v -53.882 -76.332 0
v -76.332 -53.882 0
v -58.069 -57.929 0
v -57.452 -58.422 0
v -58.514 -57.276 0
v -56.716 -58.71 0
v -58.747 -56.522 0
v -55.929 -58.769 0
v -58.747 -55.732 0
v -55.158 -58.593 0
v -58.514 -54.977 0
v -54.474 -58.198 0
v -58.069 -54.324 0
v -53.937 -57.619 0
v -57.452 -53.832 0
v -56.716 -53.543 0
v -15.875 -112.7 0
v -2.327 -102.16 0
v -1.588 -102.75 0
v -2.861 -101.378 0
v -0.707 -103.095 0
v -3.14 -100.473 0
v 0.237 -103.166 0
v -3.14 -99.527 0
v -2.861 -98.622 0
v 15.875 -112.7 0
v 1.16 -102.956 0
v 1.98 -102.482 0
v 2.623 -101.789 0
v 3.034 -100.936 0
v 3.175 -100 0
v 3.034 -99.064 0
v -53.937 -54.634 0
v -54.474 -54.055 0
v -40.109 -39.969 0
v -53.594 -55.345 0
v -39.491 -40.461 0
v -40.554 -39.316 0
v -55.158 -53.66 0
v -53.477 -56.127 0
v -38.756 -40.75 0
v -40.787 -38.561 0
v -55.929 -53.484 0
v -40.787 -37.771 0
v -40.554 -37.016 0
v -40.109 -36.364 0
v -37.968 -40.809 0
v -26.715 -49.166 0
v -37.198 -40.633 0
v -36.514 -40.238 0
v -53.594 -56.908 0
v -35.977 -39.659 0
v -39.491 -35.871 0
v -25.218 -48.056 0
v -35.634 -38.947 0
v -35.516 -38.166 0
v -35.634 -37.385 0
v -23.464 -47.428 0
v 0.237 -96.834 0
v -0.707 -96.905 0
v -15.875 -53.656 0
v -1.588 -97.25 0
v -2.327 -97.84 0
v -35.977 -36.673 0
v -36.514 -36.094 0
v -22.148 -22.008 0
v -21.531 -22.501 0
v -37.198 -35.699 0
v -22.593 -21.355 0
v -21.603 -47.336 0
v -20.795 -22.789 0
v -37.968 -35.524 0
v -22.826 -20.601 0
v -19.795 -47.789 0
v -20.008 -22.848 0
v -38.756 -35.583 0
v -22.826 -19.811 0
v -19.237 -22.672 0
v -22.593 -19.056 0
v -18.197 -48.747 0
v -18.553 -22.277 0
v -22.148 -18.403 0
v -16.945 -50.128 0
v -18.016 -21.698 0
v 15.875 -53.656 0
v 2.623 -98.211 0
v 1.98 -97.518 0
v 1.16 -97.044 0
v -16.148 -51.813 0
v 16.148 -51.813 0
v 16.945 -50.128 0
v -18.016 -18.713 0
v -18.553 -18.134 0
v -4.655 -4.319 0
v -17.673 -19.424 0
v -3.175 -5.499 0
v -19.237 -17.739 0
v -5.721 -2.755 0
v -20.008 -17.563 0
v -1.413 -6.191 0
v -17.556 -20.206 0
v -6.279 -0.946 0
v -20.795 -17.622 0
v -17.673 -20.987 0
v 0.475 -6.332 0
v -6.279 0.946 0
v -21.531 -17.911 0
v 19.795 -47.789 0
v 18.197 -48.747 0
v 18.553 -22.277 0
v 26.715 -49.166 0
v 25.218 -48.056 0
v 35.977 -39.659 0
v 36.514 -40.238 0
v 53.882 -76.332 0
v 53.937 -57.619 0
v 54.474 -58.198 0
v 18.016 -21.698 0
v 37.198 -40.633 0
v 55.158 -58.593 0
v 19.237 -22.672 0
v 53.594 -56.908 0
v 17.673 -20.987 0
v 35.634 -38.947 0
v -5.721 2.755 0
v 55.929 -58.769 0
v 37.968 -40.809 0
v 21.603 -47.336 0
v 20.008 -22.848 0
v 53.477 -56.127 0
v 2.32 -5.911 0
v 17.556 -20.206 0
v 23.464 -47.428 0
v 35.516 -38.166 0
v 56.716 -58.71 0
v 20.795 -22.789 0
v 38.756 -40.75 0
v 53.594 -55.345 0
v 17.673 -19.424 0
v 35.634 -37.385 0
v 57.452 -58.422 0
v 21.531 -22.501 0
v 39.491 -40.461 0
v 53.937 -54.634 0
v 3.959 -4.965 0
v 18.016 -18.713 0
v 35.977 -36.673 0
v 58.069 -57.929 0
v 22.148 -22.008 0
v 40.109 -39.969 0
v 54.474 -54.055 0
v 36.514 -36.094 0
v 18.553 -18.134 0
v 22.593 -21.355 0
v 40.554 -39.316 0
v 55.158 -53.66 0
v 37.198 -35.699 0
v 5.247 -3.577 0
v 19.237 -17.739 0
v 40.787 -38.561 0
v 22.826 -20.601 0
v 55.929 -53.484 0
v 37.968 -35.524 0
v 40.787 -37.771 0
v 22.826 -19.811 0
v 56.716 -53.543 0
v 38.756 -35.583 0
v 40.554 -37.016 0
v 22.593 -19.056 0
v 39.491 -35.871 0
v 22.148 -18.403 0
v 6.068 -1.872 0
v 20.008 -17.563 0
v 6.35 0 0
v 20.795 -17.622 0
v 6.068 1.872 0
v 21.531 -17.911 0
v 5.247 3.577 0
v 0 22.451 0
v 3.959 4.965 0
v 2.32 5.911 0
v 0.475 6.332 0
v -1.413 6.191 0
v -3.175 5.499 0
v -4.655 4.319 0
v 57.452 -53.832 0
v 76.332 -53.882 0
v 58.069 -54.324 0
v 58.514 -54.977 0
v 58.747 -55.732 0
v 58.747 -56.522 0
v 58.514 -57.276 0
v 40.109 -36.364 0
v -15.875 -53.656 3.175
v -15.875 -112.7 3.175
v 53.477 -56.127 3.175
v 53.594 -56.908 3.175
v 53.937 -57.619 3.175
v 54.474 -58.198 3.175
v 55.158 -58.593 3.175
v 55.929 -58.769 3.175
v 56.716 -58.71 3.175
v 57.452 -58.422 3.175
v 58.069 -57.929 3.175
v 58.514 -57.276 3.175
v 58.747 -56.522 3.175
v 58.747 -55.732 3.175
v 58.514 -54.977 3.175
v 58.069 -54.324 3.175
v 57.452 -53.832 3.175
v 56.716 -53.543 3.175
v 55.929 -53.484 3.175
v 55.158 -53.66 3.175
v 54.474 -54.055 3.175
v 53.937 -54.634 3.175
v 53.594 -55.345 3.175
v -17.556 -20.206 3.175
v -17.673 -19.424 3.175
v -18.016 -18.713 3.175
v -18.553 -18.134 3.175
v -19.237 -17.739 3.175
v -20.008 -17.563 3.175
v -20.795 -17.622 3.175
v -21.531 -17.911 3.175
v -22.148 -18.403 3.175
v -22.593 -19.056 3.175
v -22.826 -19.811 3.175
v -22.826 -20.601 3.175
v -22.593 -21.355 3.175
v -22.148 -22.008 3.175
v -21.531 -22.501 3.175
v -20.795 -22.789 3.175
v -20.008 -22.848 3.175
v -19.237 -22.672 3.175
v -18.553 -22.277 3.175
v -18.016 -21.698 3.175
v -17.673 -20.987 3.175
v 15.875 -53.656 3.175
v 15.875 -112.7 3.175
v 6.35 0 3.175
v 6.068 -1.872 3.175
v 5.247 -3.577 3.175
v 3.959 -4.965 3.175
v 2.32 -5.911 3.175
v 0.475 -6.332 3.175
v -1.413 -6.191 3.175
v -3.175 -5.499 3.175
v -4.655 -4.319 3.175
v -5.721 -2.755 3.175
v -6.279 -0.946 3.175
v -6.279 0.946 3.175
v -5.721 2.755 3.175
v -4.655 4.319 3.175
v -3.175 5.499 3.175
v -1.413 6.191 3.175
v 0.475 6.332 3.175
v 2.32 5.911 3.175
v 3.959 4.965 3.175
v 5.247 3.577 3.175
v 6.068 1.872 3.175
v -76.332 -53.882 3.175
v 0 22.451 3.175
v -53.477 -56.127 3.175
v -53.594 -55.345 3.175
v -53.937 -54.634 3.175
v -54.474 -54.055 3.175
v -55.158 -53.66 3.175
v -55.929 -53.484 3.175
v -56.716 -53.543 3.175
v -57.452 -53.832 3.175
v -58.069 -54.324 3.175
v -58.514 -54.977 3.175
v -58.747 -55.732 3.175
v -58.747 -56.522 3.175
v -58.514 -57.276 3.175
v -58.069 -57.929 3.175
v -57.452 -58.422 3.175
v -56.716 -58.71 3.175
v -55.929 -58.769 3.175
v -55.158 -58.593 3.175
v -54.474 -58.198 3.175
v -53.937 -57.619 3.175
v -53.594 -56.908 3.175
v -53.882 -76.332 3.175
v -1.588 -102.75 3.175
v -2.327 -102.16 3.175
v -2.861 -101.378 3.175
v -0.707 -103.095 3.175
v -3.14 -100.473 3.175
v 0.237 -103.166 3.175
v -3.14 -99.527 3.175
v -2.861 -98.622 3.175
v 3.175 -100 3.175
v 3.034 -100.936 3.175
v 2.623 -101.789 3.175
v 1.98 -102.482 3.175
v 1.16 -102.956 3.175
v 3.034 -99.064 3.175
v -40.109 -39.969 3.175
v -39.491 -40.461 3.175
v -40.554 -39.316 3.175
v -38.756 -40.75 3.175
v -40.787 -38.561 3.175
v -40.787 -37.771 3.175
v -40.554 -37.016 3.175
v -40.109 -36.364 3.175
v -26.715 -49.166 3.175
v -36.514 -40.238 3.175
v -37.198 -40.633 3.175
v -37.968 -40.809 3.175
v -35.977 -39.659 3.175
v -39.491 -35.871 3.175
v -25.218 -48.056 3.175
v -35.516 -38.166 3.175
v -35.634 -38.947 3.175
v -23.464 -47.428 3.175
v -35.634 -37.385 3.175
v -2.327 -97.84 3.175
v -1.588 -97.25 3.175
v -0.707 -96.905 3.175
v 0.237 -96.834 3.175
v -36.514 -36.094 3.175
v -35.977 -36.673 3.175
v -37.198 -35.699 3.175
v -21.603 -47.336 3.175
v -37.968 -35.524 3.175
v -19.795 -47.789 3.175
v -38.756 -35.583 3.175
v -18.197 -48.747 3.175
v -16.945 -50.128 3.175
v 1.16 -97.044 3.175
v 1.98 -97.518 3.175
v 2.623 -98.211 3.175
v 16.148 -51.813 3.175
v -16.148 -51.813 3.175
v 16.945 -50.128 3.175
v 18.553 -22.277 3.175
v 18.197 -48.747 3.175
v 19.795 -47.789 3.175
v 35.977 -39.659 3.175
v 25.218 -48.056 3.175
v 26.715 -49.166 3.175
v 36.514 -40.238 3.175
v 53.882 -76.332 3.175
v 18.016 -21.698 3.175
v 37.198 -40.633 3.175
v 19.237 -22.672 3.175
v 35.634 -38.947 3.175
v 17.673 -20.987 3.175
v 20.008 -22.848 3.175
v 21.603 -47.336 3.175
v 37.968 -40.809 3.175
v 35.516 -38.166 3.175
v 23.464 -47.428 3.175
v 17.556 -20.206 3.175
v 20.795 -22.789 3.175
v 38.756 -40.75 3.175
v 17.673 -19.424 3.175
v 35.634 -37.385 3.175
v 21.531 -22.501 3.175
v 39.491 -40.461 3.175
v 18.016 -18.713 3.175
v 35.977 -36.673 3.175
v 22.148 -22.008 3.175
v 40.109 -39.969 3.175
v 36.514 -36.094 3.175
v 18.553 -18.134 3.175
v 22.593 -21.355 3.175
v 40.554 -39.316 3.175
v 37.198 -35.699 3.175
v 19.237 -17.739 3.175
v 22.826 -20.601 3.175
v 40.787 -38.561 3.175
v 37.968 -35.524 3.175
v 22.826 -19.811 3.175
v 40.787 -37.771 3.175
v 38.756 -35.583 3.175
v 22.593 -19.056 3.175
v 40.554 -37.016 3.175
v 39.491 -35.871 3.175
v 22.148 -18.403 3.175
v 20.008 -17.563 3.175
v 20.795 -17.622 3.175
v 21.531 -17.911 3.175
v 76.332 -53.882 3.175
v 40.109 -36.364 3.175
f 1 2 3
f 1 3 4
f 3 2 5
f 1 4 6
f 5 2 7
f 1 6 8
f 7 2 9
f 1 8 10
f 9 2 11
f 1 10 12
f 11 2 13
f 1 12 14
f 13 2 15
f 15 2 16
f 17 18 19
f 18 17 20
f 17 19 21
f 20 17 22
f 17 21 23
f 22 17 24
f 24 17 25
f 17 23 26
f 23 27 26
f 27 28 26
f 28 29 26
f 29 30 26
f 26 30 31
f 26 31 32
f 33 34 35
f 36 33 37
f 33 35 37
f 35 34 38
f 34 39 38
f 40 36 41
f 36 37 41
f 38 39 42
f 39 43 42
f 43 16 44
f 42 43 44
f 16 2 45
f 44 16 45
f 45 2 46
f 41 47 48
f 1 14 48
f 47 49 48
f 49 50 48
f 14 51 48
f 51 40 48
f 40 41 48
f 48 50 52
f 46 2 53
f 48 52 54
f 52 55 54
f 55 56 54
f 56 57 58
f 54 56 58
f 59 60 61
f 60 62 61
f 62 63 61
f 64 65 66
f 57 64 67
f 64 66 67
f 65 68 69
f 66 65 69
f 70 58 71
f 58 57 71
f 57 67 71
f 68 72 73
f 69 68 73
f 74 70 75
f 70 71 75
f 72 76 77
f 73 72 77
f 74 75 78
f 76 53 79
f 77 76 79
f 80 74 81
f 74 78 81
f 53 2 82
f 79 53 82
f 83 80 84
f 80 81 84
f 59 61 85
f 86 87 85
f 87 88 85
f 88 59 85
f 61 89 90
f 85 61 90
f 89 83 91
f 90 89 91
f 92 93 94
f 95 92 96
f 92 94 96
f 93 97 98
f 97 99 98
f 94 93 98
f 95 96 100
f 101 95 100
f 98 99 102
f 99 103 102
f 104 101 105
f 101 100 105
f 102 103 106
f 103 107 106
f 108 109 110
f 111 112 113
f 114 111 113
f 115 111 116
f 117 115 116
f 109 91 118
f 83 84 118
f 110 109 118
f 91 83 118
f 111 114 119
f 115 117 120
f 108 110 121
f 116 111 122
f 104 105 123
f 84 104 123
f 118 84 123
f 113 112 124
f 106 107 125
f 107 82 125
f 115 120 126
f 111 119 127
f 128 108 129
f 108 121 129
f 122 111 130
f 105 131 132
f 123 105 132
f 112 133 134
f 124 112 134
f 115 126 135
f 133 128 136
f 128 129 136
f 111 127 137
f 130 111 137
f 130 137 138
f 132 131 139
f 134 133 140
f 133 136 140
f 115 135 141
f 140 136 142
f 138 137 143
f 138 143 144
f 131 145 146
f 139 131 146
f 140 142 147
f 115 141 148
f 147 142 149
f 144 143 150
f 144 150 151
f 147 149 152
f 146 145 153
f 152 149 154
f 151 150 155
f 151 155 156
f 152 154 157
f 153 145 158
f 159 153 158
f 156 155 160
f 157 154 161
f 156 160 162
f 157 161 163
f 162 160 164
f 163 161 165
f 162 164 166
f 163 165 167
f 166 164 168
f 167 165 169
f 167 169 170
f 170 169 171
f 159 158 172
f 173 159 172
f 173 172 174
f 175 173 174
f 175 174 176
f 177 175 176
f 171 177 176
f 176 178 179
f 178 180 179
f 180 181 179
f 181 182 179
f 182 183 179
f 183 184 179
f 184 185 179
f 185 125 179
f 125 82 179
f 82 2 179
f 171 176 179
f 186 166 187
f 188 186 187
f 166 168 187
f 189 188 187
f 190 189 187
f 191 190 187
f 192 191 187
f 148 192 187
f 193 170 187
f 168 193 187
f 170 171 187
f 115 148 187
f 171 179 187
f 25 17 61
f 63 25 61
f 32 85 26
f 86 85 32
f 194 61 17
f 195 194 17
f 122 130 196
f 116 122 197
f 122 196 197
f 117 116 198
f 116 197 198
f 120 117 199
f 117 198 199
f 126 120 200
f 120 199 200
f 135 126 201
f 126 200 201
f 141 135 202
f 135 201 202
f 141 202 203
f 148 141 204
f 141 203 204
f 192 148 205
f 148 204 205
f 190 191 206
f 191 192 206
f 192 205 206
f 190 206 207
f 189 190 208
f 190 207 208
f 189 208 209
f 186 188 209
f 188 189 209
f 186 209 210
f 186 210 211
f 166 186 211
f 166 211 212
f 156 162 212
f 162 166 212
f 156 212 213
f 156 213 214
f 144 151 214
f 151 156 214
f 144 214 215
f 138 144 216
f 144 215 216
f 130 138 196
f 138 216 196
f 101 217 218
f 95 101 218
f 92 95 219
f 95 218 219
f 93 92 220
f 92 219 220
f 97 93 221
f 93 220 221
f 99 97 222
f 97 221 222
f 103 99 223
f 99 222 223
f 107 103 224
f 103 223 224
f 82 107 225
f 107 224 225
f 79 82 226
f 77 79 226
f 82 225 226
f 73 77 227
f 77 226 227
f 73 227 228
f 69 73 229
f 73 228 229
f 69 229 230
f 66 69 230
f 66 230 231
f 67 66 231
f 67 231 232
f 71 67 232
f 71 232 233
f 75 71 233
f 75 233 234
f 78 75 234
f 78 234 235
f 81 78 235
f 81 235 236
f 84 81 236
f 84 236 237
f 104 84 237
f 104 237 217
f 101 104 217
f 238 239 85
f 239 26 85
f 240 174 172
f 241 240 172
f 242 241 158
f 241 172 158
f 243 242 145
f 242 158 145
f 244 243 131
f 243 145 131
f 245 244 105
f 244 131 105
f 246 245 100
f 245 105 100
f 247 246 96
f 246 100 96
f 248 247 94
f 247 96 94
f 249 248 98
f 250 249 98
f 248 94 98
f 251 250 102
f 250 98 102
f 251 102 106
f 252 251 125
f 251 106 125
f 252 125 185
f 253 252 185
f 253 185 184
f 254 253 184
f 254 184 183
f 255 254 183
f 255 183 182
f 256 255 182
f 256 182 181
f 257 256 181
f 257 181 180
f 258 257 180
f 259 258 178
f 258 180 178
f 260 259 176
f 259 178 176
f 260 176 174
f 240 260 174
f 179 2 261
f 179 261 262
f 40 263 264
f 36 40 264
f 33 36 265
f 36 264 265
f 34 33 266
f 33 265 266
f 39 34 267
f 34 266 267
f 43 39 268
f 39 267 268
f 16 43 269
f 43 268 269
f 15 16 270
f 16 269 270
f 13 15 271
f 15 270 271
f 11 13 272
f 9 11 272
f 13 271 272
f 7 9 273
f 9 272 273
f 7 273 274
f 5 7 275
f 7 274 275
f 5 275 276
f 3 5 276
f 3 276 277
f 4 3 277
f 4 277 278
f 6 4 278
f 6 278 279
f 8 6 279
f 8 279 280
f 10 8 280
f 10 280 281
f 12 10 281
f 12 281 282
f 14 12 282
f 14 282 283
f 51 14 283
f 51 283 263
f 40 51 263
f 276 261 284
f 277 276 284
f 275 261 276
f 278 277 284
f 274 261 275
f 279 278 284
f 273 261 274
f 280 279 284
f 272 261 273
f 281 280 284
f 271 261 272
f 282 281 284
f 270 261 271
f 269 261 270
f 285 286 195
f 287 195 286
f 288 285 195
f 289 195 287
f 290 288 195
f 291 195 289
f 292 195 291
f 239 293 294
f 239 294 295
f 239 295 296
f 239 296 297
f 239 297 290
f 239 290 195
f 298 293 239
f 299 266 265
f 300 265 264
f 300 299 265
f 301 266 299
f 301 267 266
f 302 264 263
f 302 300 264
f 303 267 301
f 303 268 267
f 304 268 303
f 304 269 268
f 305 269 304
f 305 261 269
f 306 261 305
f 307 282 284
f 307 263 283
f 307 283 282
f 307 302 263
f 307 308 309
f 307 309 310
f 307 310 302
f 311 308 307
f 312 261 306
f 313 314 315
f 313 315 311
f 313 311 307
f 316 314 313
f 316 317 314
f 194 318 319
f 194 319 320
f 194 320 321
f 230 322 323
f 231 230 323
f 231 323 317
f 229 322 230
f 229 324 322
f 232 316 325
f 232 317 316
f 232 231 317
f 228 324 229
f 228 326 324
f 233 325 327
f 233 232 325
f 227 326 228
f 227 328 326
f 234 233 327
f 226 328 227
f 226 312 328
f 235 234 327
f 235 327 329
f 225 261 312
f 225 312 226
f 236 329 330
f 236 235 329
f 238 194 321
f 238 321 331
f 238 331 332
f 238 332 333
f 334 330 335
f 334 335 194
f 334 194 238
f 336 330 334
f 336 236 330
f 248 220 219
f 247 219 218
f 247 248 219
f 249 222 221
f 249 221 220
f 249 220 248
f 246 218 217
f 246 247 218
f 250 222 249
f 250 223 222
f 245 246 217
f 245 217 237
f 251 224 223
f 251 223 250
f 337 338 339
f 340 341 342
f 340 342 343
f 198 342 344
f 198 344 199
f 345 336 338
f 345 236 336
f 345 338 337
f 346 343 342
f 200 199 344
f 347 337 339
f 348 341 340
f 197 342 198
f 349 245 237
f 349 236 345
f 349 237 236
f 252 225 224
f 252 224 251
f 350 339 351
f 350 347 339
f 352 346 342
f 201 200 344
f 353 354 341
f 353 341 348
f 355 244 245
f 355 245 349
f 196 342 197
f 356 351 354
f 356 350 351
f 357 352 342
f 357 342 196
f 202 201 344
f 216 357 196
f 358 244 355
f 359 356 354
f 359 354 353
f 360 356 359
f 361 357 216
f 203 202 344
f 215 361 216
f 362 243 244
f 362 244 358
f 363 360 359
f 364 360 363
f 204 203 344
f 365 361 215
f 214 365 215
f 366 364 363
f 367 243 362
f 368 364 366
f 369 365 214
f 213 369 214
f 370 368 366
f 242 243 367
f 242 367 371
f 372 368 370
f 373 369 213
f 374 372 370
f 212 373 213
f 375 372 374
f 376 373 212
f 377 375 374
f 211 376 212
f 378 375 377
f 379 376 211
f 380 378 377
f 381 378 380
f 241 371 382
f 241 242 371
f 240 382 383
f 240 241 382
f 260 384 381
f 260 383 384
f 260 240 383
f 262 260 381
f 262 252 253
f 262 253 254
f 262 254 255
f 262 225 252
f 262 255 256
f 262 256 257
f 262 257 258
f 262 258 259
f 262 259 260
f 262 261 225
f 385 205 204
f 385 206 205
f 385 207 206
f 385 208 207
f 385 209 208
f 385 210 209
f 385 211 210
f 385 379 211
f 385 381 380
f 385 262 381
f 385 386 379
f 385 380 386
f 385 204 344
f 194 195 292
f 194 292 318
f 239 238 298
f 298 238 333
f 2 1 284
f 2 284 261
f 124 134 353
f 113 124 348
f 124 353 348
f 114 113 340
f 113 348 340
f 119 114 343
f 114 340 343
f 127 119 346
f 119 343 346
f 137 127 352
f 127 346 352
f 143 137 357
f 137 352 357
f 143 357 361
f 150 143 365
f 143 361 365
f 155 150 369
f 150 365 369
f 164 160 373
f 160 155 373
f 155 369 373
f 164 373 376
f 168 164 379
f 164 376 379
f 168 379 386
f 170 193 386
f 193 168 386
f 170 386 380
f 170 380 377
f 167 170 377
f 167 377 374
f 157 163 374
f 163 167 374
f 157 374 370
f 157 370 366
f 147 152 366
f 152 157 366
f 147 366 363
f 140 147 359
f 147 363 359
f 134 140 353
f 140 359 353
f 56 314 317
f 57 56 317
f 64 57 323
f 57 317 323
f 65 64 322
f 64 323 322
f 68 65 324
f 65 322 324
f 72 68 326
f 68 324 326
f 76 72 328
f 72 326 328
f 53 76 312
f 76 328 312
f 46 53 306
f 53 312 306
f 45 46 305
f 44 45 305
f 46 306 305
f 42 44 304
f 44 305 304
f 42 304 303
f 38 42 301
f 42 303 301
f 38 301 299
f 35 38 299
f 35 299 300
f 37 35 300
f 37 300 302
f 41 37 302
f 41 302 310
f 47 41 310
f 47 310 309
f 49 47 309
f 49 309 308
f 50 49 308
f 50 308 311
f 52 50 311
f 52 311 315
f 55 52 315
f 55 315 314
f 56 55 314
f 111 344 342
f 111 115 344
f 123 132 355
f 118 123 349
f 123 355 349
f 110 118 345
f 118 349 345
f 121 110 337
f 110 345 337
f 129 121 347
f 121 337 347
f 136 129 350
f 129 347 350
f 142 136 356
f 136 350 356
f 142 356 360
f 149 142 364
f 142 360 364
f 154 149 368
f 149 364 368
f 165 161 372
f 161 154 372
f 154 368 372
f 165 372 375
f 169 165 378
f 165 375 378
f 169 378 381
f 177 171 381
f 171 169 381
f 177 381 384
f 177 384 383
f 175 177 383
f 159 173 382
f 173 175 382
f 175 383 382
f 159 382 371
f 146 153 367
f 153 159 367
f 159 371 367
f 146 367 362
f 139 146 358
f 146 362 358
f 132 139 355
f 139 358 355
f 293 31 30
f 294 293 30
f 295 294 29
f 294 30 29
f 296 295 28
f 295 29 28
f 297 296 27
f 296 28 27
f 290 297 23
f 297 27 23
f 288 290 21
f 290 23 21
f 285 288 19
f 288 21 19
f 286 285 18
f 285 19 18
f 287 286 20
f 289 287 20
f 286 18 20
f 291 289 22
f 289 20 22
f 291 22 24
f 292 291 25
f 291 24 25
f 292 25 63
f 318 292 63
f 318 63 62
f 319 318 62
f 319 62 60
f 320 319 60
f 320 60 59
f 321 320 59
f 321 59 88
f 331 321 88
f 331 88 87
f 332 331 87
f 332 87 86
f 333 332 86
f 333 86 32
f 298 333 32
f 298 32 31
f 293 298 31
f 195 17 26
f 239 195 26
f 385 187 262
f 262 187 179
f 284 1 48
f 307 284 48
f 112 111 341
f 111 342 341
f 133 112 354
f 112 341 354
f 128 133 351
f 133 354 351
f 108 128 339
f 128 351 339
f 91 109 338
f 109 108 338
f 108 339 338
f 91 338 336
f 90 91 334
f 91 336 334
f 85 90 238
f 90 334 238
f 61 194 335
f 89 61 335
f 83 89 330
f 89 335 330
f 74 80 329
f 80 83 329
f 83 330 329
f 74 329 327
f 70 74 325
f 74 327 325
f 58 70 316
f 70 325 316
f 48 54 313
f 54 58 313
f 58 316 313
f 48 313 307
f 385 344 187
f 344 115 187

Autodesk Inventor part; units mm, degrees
ref_plane "YZ Plane" through (0, 0, 0) normal (1, 0, 0) x (0, 1, 0)
ref_plane "XZ Plane" through (0, 0, 0) normal (0, 1, 0) x (-1, 0, 0)
ref_plane "XY Plane" through (0, 0, 0) normal (0, 0, 1) x (1, 0, 0)
sketch "Sketch1" plane through (0, 0, 0) normal (0, 0, 1) x (1, 0, 0)
  line L0 (-53.8815, -76.3322) -> (-15.875, -38.3256)
  line L1 (-53.8815, -76.3322) -> (-76.3322, -53.8815)
  line L2 (-76.3322, -53.8815) -> (0, 22.4506)
  line L3 (53.8815, -76.3322) -> (15.875, -38.3256)
  line L4 (53.8815, -76.3322) -> (76.3322, -53.8815)
  line L5 (76.3322, -53.8815) -> (0, 22.4506)
  line L6 (-106.865, 0) -> (106.865, 0) projected
  line L7 (-15.875, -38.3256) -> (-15.875, -112.7)
  line L8 (-15.875, -112.7) -> (15.875, -112.7)
  line L9 (15.875, -112.7) -> (15.875, -38.3256)
  circle A0 centre (0, -100) radius 3.175
  line L10 (0, -139.7301) -> (0, 49.4808) projected
  circle A1 centre (0, 0) radius 6.35
  point P0 (0, -112.7)
  dimension "d13" = 31.75
  dimension "d38" = 100
  dimension "d39" = 45
  dimension "d41" = 15.875
  dimension "d43" = 112.7
  dimension "d44" = 12.7
  dimension "d47" = 15.875
  dimension "d48" = 76.2
extrude "Extrusion1" add sketch "Sketch1" along normal blind 3.175 contours L1 L2 L6 A1 L10 A0 L8 L7 L0 | L2 L10 A1 L6 | L10 A0 A1 L6 L5 L4 L3 L9 L8 | L5 L6 A1 L10
sketch "Sketch2" plane through (0, 0, 3.175) normal (0, 0, 1) x (1, 0, 0)
  line L0 (-76.3322, -53.8815) -> (-53.8815, -76.3322) projected
  line L1 (-65.1069, -65.1069) -> (14.4203, 14.4203)
  line L2 (53.8815, -76.3322) -> (76.3322, -53.8815) projected
  line L3 (76.3322, -53.8815) -> (0, 22.4506) projected
  line L4 (0, 22.4506) -> (-76.3322, -53.8815) projected
  line L5 (-76.3322, -53.8815) -> (-53.8815, -76.3322) projected
  line L6 (-53.8815, -76.3322) -> (-15.875, -38.3256) projected
  line L7 (15.875, -38.3256) -> (53.8815, -76.3322) projected
  circle A0 centre (-56.1266, -56.1266) radius 2.65
  circle A1 centre (-38.1661, -38.1661) radius 2.65
  circle A2 centre (-20.2056, -20.2056) radius 2.65
  line L8 (-15.875, -38.3256) -> (-15.875, -112.7) projected
  line L9 (-15.875, -112.7) -> (15.875, -112.7) projected
  line L10 (15.875, -112.7) -> (15.875, -38.3256) projected
  point P0 (0, 0)
  dimension "d17" = 5.3
  dimension "d18" = 12.7
  dimension "d21" = 25.4
extrude "Extrusion2" cut sketch "Sketch2" against normal blind 3.175 contours A0 L1 | L1 A0 | A2 L1 | L1 A2 | A1 L1 | L1 A1
mirror "Mirror1" about plane through (0, 0, 0) normal (1, 0, 0) of "Extrusion2"
fillet "Fillet3" radius 6.35 2 edges at (-15.875, -38.3256, 1.5875) (15.875, -38.3256, 1.5875)
equation "\"d41\" = 0.5 * d13"
equation "\"d47\" = d41"
equation "\"d15\" = plateThickness"
equation "\"d17\" = boltDiameter"
equation "\"d26\" = plateThickness"
equation "\"topDiameter\" = 25"
equation "\"shaftLength\" = 76.2"
equation "\"bearingDiameter\" = 28.62"
equation "\"plateThickness\" = 3.175"
equation "\"theta12\" = 100deg"
equation "\"boltDiameter\" = 5.3"
equation "\"gearboxLength\" = 101.6"
equation "\"boltedLength\" = 76.2"
equation "\"innerBoltSpacing\" = 12.7"
equation "\"outerBoltSpacing\" = 12.7"
properties part number "CH-1-HipPivotPlate" material "Aluminum 6061"
